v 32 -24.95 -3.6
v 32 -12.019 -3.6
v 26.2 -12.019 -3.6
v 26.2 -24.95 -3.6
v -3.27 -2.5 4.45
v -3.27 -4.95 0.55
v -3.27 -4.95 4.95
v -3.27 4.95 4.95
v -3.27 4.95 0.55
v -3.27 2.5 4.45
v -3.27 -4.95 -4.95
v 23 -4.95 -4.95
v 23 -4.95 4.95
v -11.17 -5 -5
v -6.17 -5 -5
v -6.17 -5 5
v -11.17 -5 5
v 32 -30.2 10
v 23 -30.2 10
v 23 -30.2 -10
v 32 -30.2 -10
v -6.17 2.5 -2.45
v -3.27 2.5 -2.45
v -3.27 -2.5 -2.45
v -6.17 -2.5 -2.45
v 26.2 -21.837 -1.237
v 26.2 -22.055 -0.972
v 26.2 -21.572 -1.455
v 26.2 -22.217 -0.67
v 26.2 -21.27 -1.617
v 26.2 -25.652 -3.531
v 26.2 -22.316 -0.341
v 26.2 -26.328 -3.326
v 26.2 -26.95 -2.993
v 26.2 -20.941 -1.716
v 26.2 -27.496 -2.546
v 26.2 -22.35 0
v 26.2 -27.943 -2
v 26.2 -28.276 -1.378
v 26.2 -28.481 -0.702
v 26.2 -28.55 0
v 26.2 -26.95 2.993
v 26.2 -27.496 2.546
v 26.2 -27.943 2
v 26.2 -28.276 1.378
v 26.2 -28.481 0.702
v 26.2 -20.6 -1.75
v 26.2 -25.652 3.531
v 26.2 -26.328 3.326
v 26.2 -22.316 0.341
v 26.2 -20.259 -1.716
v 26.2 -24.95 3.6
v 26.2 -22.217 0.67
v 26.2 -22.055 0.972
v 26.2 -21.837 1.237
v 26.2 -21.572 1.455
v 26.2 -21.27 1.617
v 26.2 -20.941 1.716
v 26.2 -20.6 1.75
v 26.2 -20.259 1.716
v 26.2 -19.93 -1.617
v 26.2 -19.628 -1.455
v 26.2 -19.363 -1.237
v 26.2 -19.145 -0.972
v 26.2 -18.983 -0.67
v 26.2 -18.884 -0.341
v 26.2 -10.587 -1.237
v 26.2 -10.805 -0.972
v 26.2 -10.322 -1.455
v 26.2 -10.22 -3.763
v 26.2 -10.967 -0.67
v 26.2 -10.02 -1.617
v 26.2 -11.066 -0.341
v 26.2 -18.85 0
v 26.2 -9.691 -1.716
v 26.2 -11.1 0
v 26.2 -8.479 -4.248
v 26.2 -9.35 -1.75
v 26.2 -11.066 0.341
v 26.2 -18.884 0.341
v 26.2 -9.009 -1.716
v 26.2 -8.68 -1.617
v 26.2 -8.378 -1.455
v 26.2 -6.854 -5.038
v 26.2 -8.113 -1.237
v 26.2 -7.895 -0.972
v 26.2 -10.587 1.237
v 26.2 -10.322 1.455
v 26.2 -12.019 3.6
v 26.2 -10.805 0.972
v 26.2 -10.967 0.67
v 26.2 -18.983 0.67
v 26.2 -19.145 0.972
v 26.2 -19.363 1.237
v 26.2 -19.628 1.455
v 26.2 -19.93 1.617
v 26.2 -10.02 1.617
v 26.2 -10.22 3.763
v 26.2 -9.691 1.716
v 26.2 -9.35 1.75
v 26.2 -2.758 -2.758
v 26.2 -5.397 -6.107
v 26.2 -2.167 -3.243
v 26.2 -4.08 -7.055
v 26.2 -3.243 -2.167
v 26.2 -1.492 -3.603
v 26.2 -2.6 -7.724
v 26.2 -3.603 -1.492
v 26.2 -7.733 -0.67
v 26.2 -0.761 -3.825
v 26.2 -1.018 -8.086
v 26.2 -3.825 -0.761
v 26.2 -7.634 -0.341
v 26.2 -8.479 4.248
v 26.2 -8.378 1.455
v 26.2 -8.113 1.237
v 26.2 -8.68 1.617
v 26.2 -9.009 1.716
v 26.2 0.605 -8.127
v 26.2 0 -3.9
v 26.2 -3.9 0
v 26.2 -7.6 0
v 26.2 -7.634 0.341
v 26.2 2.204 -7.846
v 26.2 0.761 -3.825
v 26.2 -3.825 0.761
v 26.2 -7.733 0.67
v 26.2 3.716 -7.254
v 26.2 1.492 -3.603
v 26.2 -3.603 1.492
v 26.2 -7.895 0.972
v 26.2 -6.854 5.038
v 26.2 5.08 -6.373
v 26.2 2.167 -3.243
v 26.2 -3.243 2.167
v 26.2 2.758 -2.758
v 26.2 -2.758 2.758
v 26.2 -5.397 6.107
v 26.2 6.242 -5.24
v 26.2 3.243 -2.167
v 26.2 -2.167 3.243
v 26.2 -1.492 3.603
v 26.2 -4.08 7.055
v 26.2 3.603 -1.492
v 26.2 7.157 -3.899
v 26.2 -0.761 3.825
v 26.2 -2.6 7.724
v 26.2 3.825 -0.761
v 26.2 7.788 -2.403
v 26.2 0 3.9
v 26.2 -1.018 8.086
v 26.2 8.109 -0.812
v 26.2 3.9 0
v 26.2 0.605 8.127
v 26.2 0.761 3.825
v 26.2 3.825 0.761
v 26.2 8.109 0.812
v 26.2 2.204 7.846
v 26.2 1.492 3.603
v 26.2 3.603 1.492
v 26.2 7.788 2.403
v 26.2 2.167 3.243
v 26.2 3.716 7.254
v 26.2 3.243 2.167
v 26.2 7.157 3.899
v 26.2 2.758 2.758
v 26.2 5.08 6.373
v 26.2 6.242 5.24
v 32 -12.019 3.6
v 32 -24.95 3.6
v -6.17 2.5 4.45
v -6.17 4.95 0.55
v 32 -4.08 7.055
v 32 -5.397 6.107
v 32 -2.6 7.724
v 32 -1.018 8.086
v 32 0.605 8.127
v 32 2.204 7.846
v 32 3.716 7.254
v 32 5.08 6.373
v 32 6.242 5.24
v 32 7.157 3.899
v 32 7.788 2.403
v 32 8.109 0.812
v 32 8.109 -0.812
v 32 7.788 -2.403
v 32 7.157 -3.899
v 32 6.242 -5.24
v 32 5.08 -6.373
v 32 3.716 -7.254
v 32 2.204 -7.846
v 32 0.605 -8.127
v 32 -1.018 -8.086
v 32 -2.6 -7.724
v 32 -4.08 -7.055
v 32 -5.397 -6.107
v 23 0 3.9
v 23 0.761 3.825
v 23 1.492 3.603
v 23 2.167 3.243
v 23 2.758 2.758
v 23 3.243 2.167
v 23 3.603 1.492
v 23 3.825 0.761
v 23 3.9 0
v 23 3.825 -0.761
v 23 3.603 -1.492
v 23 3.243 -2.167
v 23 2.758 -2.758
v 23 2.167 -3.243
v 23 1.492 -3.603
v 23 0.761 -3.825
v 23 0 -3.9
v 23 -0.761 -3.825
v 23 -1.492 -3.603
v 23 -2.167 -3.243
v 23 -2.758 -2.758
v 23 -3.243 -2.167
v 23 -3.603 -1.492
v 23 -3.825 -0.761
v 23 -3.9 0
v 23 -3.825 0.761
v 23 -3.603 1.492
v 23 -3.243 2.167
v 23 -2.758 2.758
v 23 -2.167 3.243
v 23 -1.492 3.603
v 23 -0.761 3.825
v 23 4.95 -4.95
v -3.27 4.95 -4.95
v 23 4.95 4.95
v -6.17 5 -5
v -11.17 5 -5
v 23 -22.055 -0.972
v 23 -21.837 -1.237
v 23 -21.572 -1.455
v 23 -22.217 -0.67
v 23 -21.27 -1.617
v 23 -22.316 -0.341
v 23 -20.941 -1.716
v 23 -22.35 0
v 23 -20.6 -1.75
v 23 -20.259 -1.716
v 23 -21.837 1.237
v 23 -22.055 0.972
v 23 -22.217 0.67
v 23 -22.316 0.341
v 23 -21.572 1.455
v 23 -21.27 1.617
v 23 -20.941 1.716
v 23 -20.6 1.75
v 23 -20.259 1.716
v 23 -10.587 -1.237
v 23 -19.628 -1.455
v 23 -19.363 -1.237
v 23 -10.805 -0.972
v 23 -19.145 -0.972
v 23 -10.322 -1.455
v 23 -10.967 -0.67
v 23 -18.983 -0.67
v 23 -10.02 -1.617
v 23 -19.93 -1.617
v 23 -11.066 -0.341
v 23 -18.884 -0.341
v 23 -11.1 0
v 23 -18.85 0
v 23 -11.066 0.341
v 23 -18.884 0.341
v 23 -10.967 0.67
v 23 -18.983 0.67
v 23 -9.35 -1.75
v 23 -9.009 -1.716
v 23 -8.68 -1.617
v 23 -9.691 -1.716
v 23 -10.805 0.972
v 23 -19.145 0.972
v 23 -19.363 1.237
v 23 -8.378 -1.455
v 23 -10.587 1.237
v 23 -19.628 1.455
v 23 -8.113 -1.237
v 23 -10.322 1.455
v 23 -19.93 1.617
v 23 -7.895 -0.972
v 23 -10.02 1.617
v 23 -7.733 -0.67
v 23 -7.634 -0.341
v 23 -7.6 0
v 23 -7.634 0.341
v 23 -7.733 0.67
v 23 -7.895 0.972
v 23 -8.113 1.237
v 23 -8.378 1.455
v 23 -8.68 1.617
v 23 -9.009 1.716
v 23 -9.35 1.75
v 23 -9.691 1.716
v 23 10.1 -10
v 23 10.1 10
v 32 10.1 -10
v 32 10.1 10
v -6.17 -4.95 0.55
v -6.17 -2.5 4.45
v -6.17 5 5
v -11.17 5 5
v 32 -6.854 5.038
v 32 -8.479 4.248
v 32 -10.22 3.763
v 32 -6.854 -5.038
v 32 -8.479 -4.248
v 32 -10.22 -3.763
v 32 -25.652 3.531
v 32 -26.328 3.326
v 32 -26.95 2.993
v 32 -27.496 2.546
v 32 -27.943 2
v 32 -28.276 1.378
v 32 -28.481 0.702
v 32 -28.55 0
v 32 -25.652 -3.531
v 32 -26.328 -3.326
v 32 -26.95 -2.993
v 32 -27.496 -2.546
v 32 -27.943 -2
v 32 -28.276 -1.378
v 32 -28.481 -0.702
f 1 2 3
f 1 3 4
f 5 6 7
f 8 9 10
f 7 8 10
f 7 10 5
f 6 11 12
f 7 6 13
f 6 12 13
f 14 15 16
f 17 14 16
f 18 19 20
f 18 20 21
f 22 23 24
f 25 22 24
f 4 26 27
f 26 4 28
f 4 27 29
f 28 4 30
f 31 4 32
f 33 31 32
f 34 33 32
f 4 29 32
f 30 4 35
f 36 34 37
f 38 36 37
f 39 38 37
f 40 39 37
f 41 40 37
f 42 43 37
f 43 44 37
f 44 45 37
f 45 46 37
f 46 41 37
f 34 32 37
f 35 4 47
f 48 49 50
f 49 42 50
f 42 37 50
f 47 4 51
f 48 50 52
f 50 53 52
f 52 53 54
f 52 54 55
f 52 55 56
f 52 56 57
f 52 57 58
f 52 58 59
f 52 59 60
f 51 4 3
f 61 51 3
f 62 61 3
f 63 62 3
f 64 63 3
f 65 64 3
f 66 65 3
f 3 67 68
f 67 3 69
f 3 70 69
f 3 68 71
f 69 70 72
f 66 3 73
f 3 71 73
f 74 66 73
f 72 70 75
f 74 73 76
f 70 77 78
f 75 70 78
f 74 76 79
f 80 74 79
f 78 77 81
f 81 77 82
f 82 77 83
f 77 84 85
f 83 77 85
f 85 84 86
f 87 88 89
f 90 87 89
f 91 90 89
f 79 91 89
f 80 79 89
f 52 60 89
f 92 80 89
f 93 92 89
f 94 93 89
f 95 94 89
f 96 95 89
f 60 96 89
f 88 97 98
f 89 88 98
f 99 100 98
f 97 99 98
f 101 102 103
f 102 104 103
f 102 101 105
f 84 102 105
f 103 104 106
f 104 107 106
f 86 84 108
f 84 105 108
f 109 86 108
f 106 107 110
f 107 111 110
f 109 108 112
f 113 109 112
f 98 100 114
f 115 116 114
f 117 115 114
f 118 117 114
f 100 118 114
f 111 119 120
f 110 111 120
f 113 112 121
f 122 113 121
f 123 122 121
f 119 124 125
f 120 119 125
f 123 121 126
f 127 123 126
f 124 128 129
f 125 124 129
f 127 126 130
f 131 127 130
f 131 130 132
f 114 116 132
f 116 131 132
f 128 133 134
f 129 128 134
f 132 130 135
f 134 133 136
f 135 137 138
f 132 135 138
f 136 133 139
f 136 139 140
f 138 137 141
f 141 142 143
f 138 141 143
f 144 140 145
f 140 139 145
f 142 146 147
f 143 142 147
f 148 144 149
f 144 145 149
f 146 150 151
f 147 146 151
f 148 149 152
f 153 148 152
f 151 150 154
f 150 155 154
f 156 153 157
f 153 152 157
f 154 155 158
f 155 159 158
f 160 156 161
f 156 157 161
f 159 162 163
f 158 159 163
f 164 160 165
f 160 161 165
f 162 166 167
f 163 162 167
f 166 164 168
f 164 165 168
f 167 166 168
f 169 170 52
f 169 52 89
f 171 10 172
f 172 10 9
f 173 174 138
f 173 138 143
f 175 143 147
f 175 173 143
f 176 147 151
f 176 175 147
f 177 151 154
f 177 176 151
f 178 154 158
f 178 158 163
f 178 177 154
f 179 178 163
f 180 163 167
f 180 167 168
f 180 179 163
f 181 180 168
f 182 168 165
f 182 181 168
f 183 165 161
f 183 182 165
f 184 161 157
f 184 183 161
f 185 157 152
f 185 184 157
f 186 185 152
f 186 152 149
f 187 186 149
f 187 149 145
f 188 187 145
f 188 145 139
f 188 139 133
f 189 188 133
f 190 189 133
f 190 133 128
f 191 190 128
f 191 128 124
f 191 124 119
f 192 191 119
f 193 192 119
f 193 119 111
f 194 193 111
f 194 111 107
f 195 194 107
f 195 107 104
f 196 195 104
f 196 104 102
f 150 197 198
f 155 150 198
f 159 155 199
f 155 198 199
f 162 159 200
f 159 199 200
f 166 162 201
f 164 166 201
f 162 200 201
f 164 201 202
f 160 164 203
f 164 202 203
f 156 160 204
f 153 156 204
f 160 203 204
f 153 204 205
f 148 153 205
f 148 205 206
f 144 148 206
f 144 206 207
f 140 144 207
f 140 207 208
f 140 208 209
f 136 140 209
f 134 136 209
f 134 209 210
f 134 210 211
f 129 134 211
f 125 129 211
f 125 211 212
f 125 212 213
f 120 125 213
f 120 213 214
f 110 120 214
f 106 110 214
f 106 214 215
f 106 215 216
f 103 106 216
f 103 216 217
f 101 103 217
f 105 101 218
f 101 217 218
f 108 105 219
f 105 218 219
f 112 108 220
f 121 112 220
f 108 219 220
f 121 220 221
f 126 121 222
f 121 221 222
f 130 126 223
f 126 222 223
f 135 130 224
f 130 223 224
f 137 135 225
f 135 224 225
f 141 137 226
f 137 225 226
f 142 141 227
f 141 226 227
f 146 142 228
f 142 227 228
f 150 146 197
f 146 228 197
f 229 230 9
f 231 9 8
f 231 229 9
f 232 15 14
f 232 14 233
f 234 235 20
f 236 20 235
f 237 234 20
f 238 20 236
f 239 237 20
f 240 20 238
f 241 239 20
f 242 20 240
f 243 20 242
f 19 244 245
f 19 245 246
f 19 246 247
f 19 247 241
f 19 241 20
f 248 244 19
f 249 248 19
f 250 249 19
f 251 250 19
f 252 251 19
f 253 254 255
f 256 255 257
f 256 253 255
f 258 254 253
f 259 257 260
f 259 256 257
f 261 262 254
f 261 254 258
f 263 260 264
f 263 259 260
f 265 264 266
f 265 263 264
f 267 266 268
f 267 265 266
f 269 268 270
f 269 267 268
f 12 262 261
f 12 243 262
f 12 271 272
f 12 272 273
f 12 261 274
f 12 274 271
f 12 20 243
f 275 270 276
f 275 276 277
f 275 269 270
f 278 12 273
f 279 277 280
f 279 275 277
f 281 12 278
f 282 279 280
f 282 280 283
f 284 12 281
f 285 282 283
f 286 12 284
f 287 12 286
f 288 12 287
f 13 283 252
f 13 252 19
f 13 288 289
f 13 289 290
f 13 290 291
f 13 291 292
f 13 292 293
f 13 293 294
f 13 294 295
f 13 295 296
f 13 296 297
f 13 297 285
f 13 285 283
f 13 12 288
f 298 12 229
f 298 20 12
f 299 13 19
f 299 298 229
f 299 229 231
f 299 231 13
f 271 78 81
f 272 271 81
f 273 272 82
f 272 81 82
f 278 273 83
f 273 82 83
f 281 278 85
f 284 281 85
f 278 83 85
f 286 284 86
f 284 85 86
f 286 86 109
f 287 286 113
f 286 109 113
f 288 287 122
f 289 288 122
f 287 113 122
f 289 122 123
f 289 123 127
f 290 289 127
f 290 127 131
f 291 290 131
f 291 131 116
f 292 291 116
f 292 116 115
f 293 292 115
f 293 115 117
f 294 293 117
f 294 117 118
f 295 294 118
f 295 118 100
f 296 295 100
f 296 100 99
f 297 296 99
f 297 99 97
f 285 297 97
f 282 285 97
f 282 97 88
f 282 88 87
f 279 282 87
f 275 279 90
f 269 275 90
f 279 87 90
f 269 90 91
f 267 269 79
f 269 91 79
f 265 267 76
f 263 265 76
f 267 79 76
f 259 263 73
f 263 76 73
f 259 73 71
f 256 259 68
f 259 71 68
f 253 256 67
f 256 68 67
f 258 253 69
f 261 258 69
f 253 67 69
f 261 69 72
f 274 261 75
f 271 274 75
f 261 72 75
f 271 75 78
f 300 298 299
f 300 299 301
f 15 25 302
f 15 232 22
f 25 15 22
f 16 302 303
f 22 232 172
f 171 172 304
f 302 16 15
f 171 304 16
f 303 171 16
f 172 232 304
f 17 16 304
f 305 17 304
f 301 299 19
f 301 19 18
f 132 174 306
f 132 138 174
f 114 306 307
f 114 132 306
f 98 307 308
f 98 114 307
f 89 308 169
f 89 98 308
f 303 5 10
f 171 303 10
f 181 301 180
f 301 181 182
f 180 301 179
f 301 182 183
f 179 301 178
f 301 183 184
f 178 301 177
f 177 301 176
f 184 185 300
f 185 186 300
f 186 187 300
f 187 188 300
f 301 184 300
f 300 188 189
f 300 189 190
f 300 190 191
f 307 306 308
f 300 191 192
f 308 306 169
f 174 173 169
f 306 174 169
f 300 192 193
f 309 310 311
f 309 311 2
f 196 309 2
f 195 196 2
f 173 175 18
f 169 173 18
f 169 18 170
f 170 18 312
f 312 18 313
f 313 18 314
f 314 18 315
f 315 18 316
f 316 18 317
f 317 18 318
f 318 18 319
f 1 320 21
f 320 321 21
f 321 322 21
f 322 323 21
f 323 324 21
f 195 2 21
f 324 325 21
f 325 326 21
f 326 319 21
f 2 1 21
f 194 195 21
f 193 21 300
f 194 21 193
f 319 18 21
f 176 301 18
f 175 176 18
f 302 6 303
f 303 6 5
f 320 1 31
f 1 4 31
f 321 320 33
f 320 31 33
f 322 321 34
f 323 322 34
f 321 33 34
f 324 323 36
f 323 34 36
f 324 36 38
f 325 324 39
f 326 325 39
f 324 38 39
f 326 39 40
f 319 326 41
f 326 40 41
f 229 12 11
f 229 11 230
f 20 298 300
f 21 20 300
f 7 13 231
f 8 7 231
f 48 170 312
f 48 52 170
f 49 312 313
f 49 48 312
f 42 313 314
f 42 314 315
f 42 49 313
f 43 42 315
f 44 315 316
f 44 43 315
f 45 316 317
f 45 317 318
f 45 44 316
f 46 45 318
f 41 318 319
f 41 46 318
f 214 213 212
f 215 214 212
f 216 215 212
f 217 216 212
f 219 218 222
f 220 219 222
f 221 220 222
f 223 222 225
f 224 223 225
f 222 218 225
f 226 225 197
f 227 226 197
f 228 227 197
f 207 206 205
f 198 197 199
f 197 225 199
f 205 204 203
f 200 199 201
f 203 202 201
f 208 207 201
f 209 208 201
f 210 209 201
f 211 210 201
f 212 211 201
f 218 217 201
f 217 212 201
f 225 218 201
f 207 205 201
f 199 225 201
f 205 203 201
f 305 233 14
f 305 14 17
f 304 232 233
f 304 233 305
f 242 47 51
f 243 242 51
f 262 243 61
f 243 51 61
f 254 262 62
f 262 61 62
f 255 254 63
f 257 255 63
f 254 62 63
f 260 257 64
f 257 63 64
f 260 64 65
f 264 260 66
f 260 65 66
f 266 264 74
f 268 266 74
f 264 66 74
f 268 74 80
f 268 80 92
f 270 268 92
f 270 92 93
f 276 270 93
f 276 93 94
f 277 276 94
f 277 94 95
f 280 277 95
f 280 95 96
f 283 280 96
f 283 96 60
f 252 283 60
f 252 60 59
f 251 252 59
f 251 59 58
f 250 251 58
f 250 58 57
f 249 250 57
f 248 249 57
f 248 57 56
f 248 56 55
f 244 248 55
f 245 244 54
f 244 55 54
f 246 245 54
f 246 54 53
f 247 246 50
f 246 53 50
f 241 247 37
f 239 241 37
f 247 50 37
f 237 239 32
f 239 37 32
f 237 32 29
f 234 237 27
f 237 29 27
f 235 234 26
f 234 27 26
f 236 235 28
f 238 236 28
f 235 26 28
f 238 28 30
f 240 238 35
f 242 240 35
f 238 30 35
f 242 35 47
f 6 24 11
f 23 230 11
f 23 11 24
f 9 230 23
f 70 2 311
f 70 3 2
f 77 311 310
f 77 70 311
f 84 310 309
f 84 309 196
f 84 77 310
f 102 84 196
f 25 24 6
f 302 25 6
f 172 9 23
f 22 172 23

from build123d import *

# Parameters (mm, degrees)
SKETCH1_W            = 20
SKETCH1_H            = 20
BOSS_EXTRUDE1_DEPTH  = 20
SKETCH2_W            = 45
SKETCH2_H            = 70
BOSS_EXTRUDE2_DEPTH  = 12
CUT_EXTRUDE1_DEPTH   = 5.8
FILLET1_R            = 3.6
FILLET2_R            = 10
SKETCH5_R            = 3.9
CUT_EXTRUDE2_DEPTH   = 53.490475326
CUT_EXTRUDE3_REACH   = 51.17
SKETCH6_R            = 1.75
SKETCH7_W            = 12
SKETCH7_H            = 45
CUT_EXTRUDE4_DEPTH   = 4.8
SKETCH9_W            = 12
SKETCH9_H            = 45
CUT_EXTRUDE5_DEPTH   = 23.8
SKETCH10_W           = 12.5
SKETCH10_H           = 41.4
CUT_EXTRUDE6_DEPTH   = 23.8
SKETCH11_W           = 20
SKETCH11_H           = 1.2
CUT_EXTRUDE7_DEPTH   = 23.8
BOSS_EXTRUDE3_START  = 20
SKETCH12_W           = 20
SKETCH12_H           = 20
SKETCH12_R           = 3.9
BOSS_EXTRUDE3_DEPTH  = 20
SKETCH13_W           = 20.2
SKETCH13_H           = 20.2
SKETCH13_R           = 3.9
BOSS_EXTRUDE4_DEPTH  = 40
SKETCH14_W           = 12
SKETCH14_H           = 20
BOSS_EXTRUDE5_DEPTH  = 0.1
SKETCH17_R           = 4.83091966
BOSS_EXTRUDE8_DEPTH  = 39
SKETCH18_W           = 25.638800628
SKETCH18_H           = 46.621959296
CUT_EXTRUDE8_DEPTH   = 43
SKETCH19_W           = 9.9
SKETCH19_H           = 9.9
BOSS_EXTRUDE9_DEPTH  = 26.27
BOSS_EXTRUDE10_DEPTH = 2.9
SKETCH21_W           = 10
SKETCH21_H           = 10
BOSS_EXTRUDE11_DEPTH = 5


with BuildPart() as part:
    # Sketch1 → Boss-Extrude1 (new body)
    with BuildSketch(Plane(origin=(0, 0, 0), x_dir=(0, 0, -1), z_dir=(1, 0, 0))):
        Rectangle(SKETCH1_W, SKETCH1_H)
    extrude(amount=BOSS_EXTRUDE1_DEPTH)

    # Sketch2 → Boss-Extrude2 (add)
    with BuildSketch(Plane(origin=(20, 0, 0), x_dir=(0, 0, -1), z_dir=(1, 0, 0))):
        Rectangle(SKETCH2_W, SKETCH2_H)
    extrude(amount=BOSS_EXTRUDE2_DEPTH)

    # Sketch4 → Cut-Extrude1 (cut)
    with BuildSketch(Plane(origin=(32, 0, 0), x_dir=(0, 0, -1), z_dir=(1, 0, 0))):
        with BuildLine():
            Line((3.6, -28.55), (-3.6, -28.55))
            Line((-3.6, -28.55), (-3.6, -7.311805523))
            ThreePointArc((-3.6, -7.311805523), (0, 8.15), (3.6, -7.311805523))
            Line((3.6, -7.311805523), (3.6, -28.55))
        make_face()
    extrude(amount=-CUT_EXTRUDE1_DEPTH, mode=Mode.SUBTRACT)

    # Fillet1
    fillet1_edges = [part.edges().sort_by_distance(p)[0] for p in [
        (29.1, -28.55, 3.6),
        (29.1, -28.55, -3.6),
    ]]
    fillet(fillet1_edges, radius=FILLET1_R - 0.0001)  # a hair under: the kernel refuses the full size

    # Fillet2
    fillet2_edges = [part.edges().sort_by_distance(p)[0] for p in [
        (29.1, -7.311805523, 3.6),
        (29.1, -7.311805523, -3.6),
    ]]
    fillet(fillet2_edges, radius=FILLET2_R)

    # Sketch5 → Cut-Extrude2 (cut, through all)
    with BuildSketch(Plane.ZY):
        Circle(SKETCH5_R)
    extrude(amount=-CUT_EXTRUDE2_DEPTH, mode=Mode.SUBTRACT)

    # Sketch6 → Cut-Extrude3 (cut, up to next)
    with BuildSketch(Plane(origin=(26.2, 0, 0), x_dir=(0, 0, -1), z_dir=(1, 0, 0)), mode=Mode.PRIVATE) as cut_extrude3_sk1:
        with Locations((0, -20.6)):
            Circle(SKETCH6_R)
    cut_extrude3_tool1 = extrude(cut_extrude3_sk1.sketch, amount=-CUT_EXTRUDE3_REACH, mode=Mode.PRIVATE) & part.part
    # Sketch6 → Cut-Extrude3 (cut, up to next)
    with BuildSketch(Plane(origin=(26.2, 0, 0), x_dir=(0, 0, -1), z_dir=(1, 0, 0)), mode=Mode.PRIVATE) as cut_extrude3_sk2:
        with Locations((0, -9.35)):
            Circle(SKETCH6_R)
    cut_extrude3_tool2 = extrude(cut_extrude3_sk2.sketch, amount=-CUT_EXTRUDE3_REACH, mode=Mode.PRIVATE) & part.part
    add(cut_extrude3_tool1.solids().sort_by_distance((26.2, -20.6, 0))[0], mode=Mode.SUBTRACT)
    add(cut_extrude3_tool2.solids().sort_by_distance((26.2, -9.35, 0))[0], mode=Mode.SUBTRACT)

    # Sketch7 → Cut-Extrude4 (cut)
    with BuildSketch(Plane.XZ.offset(35)):
        with Locations((26, 0)):
            Rectangle(SKETCH7_W, SKETCH7_H)
    extrude(amount=-CUT_EXTRUDE4_DEPTH, mode=Mode.SUBTRACT)

    # Sketch9 → Cut-Extrude5 (cut)
    with BuildSketch(Plane(origin=(0, 35, 0), x_dir=(1, 0, 0), z_dir=(0, 1, 0))):
        with Locations((26, 0)):
            Rectangle(SKETCH9_W, SKETCH9_H)
    extrude(amount=-CUT_EXTRUDE5_DEPTH, mode=Mode.SUBTRACT)

    # Sketch10 → Cut-Extrude6 (cut)
    with BuildSketch(Plane.ZY.offset(-20)):
        with Locations((-16.25, -9.5)):
            Rectangle(SKETCH10_W, SKETCH10_H)
        with Locations((16.25, -9.5)):
            Rectangle(SKETCH10_W, SKETCH10_H)
    extrude(amount=-CUT_EXTRUDE6_DEPTH, mode=Mode.SUBTRACT)

    # Sketch11 → Cut-Extrude7 (cut)
    with BuildSketch(Plane.ZY.offset(-20)):
        with Locations((0, 10.6)):
            Rectangle(SKETCH11_W, SKETCH11_H)
    extrude(amount=-CUT_EXTRUDE7_DEPTH, mode=Mode.SUBTRACT)

    # Sketch12 → Boss-Extrude3 (add)
    with BuildSketch(Plane.ZY.offset(BOSS_EXTRUDE3_START)):
        Rectangle(SKETCH12_W, SKETCH12_H)
        Circle(SKETCH12_R, mode=Mode.SUBTRACT)
    extrude(amount=-BOSS_EXTRUDE3_DEPTH)

    # Sketch13 → Boss-Extrude4 (add)
    with BuildSketch(Plane.ZY.offset(20)):
        Rectangle(SKETCH13_W, SKETCH13_H)
        Circle(SKETCH13_R, mode=Mode.SUBTRACT)
    extrude(amount=-BOSS_EXTRUDE4_DEPTH)

    # Sketch14 → Boss-Extrude5 (add)
    with BuildSketch(Plane(origin=(0, 10, 0), x_dir=(1, 0, 0), z_dir=(0, 1, 0))):
        with Locations((26, 0)):
            Rectangle(SKETCH14_W, SKETCH14_H)
    extrude(amount=BOSS_EXTRUDE5_DEPTH)

    # Sketch17 → Boss-Extrude8 (add)
    with BuildSketch(Plane.ZY.offset(20)):
        Circle(SKETCH17_R)
    extrude(amount=-BOSS_EXTRUDE8_DEPTH)

    # Sketch18 → Cut-Extrude8 (cut)
    with BuildSketch(Plane.ZY.offset(20)):
        with Locations((-2.719400314, -13.210979648)):
            Rectangle(SKETCH18_W, SKETCH18_H)
    extrude(amount=-CUT_EXTRUDE8_DEPTH, mode=Mode.SUBTRACT)

    # Sketch19 → Boss-Extrude9 (add)
    with BuildSketch(Plane.ZY.offset(-23)):
        Rectangle(SKETCH19_W, SKETCH19_H)
    extrude(amount=BOSS_EXTRUDE9_DEPTH)

    # Sketch20 → Boss-Extrude10 (add)
    with BuildSketch(Plane.ZY.offset(3.27)):
        Polygon((0.55, 4.95), (-2.45, 2.5), (-2.45, -2.5), (0.55, -4.95), (4.45, -2.5), (4.45, 2.5), align=None)
    extrude(amount=BOSS_EXTRUDE10_DEPTH)

    # Sketch21 → Boss-Extrude11 (add)
    with BuildSketch(Plane.ZY.offset(6.17)):
        Rectangle(SKETCH21_W, SKETCH21_H)
    extrude(amount=BOSS_EXTRUDE11_DEPTH)


solid = part.part
